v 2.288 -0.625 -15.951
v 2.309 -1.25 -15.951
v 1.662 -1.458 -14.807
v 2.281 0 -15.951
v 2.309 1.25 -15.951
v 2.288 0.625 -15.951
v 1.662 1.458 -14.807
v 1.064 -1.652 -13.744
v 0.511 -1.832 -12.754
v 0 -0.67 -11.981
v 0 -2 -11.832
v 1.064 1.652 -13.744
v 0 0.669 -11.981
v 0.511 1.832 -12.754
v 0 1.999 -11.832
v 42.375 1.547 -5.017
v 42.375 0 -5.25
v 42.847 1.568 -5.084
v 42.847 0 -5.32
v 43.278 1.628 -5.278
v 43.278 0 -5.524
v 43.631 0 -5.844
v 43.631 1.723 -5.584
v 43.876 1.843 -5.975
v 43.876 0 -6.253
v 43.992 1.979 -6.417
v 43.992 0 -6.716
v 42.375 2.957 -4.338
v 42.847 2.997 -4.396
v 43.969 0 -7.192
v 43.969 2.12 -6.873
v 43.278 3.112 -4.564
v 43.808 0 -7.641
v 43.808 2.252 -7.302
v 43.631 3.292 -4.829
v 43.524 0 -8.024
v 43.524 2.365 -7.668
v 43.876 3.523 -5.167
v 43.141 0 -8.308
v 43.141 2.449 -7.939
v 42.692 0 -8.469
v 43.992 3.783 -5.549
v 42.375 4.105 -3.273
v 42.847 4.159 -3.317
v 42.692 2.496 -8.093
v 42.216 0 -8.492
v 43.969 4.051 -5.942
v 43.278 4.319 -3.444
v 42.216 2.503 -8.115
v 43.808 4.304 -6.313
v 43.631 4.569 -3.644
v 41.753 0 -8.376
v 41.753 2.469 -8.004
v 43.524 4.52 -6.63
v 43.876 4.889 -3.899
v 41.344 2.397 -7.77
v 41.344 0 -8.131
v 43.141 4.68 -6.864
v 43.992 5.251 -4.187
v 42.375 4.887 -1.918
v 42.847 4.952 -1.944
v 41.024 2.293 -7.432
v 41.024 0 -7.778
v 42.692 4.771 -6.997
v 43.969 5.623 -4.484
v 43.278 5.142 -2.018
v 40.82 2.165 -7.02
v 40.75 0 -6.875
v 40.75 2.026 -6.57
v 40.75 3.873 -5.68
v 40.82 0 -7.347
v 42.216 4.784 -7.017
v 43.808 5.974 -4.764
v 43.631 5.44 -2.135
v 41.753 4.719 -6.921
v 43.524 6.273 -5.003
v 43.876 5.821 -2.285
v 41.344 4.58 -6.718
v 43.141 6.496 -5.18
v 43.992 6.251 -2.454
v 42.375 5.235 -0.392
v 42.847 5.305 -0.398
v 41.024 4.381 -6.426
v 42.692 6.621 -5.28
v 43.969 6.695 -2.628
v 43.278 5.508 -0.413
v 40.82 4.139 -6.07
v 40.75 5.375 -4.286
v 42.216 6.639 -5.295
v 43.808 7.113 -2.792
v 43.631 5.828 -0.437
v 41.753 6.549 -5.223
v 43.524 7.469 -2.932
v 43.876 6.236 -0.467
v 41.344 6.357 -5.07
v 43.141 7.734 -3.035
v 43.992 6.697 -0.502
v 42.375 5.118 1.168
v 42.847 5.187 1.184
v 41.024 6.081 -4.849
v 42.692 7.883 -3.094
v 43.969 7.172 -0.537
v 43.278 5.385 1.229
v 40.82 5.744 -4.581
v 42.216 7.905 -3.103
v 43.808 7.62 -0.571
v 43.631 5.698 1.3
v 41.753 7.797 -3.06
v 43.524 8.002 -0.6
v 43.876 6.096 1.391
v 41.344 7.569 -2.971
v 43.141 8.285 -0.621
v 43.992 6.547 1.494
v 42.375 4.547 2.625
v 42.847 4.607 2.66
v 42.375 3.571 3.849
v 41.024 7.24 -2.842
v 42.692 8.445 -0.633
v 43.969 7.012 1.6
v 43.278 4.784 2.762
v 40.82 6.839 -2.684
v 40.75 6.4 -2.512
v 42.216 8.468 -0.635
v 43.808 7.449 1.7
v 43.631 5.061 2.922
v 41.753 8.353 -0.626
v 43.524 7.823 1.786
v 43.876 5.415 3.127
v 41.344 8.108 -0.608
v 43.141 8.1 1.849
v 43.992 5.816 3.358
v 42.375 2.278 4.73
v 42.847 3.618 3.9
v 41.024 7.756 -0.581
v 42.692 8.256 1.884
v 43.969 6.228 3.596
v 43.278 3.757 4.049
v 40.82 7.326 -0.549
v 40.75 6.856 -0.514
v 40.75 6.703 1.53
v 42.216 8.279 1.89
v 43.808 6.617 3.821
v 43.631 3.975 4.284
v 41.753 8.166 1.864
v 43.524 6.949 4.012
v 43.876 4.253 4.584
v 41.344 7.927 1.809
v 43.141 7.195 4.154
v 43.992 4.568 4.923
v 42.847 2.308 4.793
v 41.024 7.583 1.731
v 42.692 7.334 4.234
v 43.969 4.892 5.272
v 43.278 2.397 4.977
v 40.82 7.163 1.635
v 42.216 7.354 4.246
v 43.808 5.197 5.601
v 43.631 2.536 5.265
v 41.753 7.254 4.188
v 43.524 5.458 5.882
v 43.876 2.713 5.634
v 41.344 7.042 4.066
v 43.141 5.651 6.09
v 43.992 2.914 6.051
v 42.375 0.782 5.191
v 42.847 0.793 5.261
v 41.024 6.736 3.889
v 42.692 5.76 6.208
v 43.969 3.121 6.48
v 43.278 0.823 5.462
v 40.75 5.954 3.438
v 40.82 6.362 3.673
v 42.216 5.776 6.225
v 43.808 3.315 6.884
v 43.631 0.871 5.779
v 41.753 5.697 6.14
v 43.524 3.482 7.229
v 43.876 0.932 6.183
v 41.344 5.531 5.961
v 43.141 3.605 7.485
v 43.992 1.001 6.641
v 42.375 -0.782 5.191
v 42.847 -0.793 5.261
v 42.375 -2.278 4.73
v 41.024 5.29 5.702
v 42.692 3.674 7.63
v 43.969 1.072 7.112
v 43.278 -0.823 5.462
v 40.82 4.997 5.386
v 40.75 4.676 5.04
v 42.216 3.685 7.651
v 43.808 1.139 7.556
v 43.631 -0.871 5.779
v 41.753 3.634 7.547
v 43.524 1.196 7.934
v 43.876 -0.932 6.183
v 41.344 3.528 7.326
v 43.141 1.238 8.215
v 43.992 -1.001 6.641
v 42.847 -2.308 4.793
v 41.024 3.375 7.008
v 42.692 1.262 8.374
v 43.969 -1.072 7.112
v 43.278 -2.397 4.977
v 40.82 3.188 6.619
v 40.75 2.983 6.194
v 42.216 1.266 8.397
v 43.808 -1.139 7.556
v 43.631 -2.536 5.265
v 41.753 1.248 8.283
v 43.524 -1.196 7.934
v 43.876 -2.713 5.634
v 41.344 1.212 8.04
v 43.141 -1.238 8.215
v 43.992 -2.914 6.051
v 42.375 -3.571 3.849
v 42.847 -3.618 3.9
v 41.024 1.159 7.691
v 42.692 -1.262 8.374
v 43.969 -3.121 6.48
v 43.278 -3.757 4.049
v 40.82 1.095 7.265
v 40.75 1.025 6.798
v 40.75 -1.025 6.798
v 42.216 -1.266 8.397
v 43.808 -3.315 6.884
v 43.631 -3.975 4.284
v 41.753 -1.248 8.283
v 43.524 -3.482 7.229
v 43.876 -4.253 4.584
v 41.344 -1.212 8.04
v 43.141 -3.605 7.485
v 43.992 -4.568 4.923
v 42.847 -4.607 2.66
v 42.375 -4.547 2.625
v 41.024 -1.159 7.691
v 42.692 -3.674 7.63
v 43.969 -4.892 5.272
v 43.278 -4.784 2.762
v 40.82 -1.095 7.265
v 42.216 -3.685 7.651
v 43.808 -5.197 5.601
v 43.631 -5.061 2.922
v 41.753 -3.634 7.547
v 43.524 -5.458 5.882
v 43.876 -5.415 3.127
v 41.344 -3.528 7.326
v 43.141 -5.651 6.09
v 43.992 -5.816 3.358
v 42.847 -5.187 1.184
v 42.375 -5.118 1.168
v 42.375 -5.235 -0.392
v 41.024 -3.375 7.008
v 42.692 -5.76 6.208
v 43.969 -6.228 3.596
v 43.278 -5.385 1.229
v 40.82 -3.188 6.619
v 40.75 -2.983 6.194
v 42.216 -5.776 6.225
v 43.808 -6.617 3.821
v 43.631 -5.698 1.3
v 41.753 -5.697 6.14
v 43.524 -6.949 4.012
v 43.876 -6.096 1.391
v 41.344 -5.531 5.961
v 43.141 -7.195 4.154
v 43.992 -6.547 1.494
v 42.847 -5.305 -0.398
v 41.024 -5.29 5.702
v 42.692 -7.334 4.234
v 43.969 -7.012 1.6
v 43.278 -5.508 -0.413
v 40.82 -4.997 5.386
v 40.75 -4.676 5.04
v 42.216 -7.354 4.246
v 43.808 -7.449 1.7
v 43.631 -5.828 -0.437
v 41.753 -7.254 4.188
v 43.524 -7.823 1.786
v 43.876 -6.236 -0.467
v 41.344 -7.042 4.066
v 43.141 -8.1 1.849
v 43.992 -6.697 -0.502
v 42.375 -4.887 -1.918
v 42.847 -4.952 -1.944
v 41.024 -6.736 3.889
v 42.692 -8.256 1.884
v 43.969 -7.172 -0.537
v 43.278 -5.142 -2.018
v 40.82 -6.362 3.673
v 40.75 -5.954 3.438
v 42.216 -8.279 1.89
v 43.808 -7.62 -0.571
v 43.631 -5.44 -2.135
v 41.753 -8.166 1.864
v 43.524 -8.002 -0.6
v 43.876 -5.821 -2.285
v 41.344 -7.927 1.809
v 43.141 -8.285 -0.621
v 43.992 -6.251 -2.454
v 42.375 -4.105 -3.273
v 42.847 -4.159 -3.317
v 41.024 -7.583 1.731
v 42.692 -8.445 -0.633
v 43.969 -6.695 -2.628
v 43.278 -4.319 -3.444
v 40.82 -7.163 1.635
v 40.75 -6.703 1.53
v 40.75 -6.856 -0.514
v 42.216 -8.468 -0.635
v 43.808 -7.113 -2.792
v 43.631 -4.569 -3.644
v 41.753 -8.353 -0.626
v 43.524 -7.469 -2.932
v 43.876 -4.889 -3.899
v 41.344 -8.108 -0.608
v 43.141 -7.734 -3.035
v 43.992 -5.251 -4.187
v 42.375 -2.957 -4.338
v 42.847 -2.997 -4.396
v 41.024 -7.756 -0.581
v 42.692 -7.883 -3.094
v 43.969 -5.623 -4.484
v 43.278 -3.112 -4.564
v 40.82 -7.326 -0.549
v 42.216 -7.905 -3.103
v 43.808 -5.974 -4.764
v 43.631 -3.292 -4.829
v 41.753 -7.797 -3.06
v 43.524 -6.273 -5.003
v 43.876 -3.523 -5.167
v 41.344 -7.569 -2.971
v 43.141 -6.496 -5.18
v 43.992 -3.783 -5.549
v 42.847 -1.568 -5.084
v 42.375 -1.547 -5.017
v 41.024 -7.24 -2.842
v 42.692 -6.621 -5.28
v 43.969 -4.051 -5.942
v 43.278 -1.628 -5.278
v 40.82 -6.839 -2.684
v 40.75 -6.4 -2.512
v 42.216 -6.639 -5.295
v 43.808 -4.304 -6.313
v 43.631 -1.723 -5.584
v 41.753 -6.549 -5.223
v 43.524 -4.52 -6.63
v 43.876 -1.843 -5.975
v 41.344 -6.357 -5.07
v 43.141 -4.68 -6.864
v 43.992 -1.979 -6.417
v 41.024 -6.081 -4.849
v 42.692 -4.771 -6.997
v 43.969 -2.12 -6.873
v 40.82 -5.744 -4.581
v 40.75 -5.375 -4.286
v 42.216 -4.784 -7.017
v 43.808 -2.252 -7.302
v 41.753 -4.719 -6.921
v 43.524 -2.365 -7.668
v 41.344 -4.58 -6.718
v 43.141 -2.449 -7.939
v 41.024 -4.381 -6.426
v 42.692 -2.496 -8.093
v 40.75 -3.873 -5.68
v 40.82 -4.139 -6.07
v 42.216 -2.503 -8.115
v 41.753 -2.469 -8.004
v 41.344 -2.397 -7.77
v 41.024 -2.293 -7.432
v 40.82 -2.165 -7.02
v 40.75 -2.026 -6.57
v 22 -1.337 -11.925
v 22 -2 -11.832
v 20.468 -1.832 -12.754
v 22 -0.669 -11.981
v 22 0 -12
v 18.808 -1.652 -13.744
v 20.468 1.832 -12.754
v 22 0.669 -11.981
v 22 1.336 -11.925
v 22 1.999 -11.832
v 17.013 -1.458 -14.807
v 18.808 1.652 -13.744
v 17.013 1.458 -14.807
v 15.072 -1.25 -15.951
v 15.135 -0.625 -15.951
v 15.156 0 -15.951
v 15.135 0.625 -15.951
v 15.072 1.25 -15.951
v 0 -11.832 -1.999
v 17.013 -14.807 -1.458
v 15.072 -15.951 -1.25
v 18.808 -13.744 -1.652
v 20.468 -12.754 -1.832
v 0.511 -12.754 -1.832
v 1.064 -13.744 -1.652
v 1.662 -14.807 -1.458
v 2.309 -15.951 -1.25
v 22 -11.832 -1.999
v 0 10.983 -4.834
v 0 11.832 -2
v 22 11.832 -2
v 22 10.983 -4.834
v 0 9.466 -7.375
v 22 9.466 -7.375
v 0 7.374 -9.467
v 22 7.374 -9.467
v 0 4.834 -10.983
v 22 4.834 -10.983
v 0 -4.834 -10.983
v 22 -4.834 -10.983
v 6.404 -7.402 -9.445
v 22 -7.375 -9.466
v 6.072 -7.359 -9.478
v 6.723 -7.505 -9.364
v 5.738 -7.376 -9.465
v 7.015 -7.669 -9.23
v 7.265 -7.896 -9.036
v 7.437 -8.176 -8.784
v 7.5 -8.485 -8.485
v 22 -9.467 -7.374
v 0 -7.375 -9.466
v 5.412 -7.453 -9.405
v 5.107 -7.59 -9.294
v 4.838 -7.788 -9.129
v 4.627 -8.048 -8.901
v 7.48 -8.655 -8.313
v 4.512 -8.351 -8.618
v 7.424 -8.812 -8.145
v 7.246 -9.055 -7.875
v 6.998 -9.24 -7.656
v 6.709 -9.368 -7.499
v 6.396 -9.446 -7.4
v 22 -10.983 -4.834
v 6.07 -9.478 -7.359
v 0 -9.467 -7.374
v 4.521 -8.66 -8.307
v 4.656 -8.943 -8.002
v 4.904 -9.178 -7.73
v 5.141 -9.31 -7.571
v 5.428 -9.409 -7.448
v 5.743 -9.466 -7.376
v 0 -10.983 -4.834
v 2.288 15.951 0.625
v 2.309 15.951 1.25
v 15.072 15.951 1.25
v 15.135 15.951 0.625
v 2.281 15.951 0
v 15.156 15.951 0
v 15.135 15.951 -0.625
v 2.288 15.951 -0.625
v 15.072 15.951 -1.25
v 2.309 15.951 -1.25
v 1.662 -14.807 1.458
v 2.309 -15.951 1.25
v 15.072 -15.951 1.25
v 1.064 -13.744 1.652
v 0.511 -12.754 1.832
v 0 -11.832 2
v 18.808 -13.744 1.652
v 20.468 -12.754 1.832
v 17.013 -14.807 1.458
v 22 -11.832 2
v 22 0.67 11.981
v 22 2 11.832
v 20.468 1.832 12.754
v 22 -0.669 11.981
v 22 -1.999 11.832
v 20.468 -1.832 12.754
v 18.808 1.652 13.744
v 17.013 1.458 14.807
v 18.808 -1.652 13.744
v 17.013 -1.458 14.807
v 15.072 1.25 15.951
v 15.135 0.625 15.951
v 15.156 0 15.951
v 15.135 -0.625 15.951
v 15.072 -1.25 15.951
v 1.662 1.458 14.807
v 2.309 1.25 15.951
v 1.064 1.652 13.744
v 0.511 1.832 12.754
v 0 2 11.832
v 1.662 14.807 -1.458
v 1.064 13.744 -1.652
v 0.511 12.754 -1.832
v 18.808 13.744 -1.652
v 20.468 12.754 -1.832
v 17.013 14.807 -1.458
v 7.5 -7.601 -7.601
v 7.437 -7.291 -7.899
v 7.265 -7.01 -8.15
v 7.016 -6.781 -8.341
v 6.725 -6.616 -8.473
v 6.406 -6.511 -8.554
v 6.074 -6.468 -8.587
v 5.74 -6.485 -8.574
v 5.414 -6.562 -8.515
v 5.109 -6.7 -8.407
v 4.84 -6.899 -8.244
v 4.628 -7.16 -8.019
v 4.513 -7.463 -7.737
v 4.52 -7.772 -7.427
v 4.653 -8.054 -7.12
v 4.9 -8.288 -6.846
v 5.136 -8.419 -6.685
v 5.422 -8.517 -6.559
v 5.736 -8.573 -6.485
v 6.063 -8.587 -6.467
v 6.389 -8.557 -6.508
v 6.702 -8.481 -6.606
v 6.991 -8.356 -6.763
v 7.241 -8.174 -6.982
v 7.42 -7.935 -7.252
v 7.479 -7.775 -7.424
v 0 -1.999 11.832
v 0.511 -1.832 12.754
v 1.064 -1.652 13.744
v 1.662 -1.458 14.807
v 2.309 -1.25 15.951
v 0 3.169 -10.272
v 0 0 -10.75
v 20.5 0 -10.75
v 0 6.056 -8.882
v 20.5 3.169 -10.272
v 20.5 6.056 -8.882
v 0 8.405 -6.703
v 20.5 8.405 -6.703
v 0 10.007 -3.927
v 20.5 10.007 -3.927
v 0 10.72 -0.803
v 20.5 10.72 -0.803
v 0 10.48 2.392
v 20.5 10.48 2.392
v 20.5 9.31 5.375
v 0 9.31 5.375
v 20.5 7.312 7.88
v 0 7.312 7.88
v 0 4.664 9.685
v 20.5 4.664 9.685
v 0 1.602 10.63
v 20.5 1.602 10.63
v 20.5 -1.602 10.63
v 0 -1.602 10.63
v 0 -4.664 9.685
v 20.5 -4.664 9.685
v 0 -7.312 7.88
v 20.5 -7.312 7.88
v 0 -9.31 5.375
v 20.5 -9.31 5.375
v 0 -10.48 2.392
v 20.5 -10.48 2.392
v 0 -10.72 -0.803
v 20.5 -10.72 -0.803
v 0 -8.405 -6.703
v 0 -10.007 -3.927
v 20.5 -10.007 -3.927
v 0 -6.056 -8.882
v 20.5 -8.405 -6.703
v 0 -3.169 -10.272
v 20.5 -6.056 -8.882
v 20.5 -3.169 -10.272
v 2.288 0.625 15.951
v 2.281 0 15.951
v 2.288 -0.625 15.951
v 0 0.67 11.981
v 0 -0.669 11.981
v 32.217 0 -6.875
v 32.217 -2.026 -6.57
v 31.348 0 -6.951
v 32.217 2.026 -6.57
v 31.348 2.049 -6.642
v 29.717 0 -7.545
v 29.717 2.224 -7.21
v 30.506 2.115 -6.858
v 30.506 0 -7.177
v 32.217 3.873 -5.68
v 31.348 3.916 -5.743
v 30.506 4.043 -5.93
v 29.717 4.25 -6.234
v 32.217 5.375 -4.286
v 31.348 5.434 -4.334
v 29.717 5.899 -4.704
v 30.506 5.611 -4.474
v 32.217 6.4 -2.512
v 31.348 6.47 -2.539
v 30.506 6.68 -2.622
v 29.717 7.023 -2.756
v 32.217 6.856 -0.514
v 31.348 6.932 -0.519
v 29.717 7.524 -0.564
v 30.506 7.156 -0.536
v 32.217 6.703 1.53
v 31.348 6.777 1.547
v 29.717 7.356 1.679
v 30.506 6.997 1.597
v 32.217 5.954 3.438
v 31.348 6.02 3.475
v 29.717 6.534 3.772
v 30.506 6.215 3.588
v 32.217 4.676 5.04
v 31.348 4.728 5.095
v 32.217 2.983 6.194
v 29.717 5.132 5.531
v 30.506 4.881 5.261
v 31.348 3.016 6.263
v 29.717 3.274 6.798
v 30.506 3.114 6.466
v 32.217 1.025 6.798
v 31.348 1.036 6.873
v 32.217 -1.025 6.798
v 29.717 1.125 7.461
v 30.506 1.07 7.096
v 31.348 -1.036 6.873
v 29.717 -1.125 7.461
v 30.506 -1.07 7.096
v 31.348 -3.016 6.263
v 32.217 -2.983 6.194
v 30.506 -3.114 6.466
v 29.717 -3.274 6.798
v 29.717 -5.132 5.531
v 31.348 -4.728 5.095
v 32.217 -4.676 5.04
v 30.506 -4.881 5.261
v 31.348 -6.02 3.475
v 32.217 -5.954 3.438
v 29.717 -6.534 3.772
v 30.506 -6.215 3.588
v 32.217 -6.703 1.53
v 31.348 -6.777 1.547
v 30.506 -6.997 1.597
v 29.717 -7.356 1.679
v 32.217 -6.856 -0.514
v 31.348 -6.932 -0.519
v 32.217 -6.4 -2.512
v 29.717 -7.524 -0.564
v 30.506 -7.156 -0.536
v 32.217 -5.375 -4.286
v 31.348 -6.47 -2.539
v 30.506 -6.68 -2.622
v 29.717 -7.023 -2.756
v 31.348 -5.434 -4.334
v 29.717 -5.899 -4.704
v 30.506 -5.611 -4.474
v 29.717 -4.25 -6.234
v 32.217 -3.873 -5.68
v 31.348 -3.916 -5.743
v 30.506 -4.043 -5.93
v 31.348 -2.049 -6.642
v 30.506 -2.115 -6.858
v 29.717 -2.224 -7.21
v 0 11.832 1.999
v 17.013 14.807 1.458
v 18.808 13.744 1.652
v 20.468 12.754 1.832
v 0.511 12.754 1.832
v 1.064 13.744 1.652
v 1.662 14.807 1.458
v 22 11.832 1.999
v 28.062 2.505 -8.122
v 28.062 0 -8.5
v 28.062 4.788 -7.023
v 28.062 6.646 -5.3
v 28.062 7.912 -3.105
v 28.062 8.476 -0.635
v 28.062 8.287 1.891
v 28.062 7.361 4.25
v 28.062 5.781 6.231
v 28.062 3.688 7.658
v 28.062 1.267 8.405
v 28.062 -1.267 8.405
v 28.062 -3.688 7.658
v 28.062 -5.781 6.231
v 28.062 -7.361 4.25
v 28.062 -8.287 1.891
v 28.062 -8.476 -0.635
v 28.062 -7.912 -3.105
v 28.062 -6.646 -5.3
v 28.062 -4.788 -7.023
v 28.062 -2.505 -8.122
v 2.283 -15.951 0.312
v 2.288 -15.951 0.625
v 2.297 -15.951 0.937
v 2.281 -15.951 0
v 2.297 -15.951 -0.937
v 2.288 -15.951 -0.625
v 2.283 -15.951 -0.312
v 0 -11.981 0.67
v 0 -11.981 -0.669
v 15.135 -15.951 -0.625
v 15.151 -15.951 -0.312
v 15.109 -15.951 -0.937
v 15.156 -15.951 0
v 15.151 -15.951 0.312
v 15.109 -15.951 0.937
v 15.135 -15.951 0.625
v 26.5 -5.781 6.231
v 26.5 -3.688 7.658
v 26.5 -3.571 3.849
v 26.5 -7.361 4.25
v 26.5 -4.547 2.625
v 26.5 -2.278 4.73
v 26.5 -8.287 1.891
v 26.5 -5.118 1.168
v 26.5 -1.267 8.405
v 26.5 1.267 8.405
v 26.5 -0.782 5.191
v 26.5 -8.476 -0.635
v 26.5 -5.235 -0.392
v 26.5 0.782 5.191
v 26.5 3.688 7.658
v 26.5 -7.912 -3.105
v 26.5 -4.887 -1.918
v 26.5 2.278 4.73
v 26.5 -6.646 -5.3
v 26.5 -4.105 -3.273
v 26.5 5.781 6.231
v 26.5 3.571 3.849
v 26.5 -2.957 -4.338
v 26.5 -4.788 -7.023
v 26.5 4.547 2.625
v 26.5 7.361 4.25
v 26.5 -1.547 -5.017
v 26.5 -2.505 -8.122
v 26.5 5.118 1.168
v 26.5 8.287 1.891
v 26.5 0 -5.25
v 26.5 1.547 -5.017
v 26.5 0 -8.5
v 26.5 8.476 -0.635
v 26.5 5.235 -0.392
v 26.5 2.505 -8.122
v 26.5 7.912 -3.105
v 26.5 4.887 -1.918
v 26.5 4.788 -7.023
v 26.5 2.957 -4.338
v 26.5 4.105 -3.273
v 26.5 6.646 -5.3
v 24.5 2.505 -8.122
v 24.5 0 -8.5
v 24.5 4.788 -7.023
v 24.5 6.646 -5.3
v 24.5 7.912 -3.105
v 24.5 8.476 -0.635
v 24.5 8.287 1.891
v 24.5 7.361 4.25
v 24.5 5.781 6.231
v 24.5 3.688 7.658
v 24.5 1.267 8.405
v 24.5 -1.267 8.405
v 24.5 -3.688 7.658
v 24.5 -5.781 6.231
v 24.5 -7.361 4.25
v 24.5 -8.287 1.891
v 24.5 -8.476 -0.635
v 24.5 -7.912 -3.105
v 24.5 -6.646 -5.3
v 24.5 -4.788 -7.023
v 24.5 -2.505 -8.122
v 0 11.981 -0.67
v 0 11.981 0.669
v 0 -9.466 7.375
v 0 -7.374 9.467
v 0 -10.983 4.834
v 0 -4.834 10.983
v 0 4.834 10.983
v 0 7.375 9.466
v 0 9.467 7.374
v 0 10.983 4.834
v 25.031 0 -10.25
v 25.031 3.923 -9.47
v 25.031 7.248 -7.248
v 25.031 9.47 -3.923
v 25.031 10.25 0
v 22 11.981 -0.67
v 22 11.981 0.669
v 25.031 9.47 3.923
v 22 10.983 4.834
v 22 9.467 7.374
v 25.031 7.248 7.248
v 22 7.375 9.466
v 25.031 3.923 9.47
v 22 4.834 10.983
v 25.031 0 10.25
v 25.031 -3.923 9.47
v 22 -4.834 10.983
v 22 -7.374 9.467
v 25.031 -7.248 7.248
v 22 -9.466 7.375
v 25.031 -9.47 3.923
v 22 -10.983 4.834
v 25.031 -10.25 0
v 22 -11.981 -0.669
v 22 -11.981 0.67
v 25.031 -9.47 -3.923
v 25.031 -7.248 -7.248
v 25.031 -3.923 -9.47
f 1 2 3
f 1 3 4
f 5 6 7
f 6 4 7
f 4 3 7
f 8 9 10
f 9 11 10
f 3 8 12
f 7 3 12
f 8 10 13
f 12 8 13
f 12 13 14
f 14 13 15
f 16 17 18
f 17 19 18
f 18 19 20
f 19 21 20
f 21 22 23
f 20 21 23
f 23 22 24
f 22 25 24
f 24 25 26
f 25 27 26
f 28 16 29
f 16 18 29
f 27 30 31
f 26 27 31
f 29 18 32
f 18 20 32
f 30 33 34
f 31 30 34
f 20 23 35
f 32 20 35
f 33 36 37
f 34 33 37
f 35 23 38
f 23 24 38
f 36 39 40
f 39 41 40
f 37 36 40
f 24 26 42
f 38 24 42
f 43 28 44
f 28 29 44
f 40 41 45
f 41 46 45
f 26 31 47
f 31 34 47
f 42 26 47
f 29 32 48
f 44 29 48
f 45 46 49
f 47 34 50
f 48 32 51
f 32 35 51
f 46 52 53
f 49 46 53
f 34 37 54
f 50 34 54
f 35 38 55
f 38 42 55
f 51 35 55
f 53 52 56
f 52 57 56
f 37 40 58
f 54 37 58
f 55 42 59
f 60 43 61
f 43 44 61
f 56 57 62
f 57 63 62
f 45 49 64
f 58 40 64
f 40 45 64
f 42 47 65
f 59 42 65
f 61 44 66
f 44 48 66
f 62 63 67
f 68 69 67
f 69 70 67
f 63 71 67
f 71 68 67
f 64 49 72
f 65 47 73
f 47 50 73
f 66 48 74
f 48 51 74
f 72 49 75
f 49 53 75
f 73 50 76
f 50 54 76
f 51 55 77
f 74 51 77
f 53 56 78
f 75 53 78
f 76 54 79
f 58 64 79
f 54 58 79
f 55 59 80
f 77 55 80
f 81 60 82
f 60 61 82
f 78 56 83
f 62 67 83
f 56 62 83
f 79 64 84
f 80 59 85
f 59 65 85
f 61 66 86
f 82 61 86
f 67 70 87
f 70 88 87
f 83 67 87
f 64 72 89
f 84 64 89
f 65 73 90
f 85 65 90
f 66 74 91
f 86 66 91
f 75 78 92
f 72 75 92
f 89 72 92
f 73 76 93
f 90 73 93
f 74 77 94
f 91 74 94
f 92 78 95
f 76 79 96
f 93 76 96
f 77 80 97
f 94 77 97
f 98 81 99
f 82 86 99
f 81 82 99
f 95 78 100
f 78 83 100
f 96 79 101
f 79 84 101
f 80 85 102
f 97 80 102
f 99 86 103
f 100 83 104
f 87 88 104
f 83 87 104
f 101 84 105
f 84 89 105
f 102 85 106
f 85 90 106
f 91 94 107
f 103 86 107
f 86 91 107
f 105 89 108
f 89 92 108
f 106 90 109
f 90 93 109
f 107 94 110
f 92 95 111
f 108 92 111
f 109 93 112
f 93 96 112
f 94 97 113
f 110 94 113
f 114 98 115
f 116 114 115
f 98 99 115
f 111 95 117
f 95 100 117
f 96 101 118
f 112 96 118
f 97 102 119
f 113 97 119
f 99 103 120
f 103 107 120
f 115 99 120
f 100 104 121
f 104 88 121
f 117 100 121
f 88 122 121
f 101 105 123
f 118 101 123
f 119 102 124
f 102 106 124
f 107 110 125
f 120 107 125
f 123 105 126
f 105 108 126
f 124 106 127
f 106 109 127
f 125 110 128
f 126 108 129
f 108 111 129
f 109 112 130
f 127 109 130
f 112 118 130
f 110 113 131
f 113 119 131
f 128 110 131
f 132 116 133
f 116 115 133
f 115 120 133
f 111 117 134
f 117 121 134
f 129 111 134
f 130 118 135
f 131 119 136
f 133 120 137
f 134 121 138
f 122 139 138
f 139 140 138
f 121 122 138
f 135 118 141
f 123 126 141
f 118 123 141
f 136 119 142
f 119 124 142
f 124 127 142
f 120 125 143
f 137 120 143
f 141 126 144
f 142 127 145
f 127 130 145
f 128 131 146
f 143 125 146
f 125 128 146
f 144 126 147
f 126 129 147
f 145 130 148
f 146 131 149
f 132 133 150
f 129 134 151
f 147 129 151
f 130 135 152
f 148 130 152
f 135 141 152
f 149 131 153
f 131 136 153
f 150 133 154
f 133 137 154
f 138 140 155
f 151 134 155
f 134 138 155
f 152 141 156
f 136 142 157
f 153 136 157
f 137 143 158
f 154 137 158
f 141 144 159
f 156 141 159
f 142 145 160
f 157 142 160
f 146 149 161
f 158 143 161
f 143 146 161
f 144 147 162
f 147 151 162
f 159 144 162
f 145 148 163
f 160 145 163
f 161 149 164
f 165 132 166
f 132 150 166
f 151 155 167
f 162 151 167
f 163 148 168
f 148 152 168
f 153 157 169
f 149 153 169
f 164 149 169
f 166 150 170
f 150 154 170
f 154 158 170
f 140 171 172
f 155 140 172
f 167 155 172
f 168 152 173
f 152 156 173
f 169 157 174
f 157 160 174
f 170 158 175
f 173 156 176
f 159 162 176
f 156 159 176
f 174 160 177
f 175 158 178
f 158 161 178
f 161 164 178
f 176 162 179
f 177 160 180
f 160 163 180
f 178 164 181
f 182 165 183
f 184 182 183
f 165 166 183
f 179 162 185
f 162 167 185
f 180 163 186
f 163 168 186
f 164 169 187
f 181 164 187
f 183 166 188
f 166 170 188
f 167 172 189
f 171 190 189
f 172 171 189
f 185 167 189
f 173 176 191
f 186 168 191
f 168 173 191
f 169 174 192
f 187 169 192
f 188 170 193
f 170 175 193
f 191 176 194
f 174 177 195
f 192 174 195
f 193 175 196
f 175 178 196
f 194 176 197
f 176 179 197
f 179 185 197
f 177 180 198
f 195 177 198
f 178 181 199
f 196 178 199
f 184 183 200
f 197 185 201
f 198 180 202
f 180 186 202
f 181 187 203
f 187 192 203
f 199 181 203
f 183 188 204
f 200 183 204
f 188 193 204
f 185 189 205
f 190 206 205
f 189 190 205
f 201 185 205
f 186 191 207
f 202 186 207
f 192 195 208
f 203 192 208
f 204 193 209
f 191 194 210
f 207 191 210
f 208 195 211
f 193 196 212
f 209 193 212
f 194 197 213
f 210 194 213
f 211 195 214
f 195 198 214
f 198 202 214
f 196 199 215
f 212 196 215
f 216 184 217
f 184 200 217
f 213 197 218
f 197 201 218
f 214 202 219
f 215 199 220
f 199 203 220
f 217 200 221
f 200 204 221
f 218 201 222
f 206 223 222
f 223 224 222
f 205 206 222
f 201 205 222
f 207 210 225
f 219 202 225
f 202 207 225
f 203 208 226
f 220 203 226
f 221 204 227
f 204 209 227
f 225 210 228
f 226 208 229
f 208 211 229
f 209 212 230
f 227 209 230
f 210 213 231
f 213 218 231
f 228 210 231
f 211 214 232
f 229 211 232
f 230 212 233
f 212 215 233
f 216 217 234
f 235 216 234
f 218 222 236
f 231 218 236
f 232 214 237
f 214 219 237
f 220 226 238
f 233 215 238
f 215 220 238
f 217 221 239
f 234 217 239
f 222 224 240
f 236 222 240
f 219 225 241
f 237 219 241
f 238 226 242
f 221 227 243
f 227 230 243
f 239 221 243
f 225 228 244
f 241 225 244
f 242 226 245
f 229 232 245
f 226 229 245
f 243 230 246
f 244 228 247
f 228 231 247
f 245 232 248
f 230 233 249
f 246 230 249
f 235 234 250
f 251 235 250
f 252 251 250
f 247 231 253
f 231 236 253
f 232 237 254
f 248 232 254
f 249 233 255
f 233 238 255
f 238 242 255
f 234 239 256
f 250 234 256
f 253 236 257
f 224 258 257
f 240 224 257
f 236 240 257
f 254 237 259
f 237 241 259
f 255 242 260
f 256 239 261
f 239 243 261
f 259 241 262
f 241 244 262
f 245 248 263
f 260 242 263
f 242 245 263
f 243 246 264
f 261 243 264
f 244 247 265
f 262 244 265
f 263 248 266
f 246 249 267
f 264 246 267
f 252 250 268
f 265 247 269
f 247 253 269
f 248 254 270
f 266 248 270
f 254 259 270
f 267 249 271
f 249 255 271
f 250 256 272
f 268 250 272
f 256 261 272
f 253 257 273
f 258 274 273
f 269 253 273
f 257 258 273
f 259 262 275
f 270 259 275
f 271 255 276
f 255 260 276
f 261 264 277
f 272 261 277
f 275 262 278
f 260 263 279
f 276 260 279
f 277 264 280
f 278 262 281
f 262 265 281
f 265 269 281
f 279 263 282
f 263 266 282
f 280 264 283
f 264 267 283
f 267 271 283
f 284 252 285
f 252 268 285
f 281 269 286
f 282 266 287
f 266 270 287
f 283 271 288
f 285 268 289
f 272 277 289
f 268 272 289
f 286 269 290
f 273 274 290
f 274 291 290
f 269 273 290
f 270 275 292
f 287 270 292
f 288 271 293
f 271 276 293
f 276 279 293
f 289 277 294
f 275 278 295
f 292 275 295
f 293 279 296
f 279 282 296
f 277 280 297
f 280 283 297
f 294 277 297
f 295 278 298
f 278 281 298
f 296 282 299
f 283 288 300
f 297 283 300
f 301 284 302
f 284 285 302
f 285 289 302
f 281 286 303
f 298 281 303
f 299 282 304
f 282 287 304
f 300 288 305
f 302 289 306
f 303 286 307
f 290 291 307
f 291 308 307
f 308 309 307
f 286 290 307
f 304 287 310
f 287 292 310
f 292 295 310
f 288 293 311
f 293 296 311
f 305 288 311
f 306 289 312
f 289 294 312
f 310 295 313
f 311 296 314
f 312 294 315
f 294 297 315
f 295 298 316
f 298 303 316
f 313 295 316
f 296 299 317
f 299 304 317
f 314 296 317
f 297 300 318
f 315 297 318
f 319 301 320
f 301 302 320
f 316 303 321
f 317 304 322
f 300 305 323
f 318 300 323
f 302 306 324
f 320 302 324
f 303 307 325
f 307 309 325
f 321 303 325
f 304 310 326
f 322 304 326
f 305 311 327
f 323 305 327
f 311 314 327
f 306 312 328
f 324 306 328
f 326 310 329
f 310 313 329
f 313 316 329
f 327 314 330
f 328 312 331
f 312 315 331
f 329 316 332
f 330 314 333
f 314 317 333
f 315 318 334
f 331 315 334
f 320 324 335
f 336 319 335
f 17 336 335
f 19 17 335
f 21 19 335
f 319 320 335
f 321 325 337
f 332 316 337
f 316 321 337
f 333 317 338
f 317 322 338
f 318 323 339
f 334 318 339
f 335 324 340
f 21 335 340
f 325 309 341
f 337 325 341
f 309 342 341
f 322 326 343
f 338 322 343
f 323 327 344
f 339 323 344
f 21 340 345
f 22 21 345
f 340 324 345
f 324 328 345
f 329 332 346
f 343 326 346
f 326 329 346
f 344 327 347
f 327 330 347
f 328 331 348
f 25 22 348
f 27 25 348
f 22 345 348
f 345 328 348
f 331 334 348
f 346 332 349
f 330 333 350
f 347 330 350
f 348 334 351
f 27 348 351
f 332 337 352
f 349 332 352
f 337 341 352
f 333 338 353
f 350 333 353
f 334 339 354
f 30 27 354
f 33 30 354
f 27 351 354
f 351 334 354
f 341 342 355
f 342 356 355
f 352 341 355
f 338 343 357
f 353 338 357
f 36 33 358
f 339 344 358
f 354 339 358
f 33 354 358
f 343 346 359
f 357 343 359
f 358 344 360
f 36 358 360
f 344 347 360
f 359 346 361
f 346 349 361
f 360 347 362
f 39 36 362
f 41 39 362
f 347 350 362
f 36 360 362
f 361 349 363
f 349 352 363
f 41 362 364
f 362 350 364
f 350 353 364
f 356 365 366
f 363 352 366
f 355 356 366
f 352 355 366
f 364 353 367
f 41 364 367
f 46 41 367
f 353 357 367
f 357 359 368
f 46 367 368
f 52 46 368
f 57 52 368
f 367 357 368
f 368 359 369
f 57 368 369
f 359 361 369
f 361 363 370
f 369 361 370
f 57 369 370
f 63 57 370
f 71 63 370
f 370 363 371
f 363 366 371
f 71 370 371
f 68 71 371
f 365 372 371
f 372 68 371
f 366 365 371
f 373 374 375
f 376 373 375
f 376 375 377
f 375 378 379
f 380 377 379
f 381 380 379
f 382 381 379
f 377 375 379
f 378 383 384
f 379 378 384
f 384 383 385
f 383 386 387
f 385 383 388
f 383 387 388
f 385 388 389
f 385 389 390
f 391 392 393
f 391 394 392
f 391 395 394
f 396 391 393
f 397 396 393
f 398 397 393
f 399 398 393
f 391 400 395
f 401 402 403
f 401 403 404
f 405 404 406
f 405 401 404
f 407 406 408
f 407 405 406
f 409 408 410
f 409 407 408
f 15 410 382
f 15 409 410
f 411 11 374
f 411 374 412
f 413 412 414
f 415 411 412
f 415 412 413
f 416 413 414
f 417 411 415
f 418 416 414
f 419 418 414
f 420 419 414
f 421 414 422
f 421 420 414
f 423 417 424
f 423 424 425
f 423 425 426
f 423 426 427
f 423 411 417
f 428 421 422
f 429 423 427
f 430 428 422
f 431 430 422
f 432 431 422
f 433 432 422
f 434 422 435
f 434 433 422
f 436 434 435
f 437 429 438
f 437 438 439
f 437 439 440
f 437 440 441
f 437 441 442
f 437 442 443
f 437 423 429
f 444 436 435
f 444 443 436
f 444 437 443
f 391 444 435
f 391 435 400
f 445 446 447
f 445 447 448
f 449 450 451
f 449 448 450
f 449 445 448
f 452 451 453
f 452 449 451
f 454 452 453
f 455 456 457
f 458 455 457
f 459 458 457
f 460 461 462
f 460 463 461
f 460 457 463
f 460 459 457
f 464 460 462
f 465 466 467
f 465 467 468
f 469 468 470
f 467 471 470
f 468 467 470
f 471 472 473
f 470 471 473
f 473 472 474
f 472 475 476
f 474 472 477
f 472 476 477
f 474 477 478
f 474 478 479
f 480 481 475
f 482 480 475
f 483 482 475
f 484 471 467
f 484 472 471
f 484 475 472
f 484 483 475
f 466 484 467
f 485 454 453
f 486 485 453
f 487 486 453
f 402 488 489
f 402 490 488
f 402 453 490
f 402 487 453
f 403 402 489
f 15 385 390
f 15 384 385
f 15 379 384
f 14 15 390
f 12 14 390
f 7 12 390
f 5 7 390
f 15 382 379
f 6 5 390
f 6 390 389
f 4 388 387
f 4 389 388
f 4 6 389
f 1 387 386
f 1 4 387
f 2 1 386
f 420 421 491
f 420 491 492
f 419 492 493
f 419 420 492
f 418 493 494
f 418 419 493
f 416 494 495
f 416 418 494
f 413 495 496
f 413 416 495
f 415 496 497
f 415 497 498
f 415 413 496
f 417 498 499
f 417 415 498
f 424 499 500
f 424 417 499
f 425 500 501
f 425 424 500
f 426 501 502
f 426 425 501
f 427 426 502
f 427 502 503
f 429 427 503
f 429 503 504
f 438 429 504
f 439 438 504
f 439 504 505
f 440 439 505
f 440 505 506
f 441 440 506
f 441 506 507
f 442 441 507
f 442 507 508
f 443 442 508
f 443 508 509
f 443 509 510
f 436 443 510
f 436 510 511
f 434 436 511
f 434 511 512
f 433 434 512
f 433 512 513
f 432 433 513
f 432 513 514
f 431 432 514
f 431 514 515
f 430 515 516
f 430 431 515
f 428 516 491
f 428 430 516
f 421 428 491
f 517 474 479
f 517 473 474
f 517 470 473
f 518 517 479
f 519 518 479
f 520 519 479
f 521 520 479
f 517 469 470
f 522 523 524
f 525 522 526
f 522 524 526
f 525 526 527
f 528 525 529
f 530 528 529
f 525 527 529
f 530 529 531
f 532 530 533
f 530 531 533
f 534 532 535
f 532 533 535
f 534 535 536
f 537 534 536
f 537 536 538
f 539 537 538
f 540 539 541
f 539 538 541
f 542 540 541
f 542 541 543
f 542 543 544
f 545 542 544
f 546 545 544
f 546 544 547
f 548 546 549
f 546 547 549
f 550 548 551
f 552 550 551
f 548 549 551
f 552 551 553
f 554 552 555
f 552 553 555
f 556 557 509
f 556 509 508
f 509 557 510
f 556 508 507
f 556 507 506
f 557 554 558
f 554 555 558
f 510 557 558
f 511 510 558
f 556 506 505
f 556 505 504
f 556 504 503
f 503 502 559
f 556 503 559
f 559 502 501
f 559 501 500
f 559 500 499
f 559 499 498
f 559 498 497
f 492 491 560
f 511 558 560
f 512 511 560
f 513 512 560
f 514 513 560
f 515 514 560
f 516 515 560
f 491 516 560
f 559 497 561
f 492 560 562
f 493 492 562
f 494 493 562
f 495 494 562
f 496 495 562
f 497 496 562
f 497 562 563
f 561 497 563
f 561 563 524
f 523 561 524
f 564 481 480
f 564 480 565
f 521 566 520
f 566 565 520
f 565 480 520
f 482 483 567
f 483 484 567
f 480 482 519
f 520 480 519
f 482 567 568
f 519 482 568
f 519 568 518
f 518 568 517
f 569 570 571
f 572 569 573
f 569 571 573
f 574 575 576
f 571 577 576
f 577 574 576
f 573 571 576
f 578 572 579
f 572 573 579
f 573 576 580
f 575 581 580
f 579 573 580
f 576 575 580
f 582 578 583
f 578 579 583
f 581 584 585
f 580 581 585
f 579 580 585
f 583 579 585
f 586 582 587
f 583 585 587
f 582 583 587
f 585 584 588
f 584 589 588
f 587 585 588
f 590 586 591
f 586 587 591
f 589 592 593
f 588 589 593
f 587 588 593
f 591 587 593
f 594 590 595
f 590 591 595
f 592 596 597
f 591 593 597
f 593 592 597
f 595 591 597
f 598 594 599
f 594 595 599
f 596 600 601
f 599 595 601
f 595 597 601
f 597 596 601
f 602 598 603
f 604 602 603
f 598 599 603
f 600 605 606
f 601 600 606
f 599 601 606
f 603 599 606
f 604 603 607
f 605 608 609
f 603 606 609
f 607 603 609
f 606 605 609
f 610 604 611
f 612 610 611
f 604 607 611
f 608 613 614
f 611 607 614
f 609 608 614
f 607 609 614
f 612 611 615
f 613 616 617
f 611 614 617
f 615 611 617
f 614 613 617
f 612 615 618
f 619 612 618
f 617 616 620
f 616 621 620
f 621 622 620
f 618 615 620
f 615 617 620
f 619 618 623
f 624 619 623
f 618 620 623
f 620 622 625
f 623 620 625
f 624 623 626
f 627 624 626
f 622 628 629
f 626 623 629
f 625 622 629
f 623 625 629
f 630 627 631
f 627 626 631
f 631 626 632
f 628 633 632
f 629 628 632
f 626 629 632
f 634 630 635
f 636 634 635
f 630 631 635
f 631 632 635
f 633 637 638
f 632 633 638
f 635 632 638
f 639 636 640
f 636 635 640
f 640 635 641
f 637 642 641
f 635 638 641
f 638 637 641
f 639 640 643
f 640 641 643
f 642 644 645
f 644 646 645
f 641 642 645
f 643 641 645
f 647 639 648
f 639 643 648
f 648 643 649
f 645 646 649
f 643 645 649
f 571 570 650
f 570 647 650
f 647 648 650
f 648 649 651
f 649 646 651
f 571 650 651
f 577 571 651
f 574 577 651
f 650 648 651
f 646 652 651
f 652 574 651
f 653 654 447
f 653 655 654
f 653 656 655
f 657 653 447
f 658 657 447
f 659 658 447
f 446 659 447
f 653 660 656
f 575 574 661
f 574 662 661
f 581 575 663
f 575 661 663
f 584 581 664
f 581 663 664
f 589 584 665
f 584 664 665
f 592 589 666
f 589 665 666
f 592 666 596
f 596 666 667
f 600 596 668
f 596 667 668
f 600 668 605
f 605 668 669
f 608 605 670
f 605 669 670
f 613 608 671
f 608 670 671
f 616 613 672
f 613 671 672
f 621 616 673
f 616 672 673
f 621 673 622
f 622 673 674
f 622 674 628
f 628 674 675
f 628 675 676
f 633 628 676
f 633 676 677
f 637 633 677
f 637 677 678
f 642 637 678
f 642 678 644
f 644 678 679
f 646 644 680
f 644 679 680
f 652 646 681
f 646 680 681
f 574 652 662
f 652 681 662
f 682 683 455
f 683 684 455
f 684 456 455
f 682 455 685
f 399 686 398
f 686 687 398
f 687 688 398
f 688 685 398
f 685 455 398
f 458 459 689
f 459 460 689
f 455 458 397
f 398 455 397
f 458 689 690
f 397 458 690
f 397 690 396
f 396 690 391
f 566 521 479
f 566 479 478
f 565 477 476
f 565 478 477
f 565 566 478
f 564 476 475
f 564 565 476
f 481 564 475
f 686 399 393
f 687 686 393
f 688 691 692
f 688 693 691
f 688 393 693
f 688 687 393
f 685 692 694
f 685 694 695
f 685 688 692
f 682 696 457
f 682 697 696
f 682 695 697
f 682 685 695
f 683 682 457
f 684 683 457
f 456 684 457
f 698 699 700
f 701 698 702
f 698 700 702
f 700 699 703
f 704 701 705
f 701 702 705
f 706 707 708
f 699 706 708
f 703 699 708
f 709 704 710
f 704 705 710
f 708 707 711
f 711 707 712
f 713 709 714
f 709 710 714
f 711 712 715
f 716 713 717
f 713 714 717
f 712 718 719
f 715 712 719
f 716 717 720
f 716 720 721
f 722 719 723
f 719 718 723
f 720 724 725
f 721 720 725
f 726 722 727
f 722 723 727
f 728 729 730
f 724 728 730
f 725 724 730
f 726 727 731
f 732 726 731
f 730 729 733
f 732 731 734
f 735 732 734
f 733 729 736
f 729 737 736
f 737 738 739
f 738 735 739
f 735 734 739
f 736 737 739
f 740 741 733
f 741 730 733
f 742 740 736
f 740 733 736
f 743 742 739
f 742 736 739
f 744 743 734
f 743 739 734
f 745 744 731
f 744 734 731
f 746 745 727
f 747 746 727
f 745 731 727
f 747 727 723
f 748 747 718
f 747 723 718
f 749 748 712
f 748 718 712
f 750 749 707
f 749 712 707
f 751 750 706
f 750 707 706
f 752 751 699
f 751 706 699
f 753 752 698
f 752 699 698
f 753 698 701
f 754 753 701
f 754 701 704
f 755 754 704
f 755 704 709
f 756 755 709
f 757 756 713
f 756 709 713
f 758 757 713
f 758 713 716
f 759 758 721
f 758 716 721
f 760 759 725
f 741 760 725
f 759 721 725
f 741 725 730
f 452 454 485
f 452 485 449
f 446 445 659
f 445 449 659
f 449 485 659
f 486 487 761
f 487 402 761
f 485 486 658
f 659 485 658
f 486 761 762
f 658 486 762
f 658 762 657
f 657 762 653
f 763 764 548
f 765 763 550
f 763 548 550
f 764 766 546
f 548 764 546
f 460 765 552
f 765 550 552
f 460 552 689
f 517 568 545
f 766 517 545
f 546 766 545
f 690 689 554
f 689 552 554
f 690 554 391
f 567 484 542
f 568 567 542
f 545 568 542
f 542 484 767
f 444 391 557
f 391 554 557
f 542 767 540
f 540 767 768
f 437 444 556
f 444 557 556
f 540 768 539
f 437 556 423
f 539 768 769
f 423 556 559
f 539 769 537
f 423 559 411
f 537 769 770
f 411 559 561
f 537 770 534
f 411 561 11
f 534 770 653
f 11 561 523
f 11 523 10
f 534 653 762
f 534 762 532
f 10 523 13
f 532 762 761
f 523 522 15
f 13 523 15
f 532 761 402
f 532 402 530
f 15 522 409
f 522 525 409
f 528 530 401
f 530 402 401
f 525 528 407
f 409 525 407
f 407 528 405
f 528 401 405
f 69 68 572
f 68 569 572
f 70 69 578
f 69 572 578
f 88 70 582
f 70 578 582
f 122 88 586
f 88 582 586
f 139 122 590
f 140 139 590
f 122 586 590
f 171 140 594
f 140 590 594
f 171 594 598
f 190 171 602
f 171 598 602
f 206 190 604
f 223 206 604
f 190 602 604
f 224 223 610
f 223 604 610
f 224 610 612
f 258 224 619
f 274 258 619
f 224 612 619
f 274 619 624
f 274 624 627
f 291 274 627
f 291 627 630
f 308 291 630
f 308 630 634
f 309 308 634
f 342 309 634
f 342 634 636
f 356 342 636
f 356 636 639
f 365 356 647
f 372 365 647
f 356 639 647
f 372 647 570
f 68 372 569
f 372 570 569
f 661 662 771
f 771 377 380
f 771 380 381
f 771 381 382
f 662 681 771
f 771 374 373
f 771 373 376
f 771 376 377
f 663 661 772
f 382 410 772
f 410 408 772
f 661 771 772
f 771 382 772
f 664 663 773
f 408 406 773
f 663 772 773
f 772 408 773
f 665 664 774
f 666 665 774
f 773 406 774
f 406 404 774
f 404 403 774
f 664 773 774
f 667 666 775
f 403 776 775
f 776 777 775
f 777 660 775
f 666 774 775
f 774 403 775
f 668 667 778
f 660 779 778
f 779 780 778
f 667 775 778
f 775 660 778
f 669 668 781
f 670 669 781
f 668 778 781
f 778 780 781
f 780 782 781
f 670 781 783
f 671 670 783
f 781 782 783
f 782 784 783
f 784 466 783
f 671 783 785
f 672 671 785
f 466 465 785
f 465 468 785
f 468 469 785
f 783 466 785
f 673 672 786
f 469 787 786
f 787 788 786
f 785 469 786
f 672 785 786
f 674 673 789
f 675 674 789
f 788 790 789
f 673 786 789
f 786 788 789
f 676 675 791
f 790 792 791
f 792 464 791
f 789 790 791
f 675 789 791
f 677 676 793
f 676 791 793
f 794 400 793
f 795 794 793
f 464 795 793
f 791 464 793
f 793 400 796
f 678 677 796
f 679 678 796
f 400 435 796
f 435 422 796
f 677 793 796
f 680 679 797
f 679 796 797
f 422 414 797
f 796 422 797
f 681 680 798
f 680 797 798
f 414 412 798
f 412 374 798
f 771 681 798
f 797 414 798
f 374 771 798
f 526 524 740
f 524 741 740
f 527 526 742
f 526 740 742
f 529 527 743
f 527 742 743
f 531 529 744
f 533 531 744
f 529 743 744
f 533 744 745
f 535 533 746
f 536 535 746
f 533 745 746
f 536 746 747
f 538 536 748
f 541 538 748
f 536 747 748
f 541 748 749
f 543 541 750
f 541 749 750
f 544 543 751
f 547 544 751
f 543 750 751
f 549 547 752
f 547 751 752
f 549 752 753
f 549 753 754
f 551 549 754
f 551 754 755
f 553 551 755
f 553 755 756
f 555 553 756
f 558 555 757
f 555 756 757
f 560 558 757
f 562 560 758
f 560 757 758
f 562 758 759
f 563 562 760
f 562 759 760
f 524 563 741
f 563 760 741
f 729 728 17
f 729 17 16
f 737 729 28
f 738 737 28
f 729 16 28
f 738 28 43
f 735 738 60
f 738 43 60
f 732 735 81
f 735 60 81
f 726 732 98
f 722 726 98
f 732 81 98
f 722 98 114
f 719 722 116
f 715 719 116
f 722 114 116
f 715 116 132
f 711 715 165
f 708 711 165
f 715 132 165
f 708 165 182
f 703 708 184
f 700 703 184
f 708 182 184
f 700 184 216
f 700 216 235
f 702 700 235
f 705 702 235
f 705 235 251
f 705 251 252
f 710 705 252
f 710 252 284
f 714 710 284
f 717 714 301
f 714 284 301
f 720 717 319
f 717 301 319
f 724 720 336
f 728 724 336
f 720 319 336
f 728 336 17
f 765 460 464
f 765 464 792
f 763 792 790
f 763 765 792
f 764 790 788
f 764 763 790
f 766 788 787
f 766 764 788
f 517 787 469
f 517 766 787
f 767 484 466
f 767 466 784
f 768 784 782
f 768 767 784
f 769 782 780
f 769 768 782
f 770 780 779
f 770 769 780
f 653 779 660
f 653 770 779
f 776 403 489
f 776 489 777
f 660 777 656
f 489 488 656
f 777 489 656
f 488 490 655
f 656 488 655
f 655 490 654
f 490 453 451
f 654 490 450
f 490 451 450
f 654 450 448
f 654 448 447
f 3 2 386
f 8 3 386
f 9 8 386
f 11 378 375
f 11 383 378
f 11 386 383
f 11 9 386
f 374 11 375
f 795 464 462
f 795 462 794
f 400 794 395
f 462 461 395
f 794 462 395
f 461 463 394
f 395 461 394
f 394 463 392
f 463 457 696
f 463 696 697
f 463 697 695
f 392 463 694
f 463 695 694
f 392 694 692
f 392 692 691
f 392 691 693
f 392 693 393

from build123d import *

# Parameters (mm, degrees)
CUT_EXTRUDE9_DEPTH  = 45.0000001
CUT_EXTRUDE10_REACH = 36.558
SKETCH8_R           = 1.5


with BuildPart() as part:
    # Sketch1 → Revolve1 (revolve)
    with BuildSketch(Plane(origin=(0, 0, 0), x_dir=(1, 0, 0), z_dir=(0, 1, 0))):
        with BuildLine():
            Line((0, 12), (0, 10.75))
            Line((0, 10.75), (3.5, 10.75))
            Line((3.5, 10.75), (18.5, 10.75))
            Line((18.5, 10.75), (20.5, 10.75))
            Line((20.5, 10.75), (24.5, 8.5))
            Line((24.5, 8.5), (26.5, 8.5))
            Line((26.5, 8.5), (26.5, 5.25))
            Line((26.5, 5.25), (42.375, 5.25))
            ThreePointArc((42.375, 5.25), (43.524048519, 8.024048519), (40.75, 6.875))
            Line((40.75, 6.875), (32.216506351, 6.875))
            ThreePointArc((32.216506351, 6.875), (30.922411125, 7.045370869), (29.716506351, 7.544872981))
            Line((29.716506351, 7.544872981), (28.062177826, 8.5))
            Line((28.062177826, 8.5), (22, 12))
            Line((22, 12), (0, 12))
        make_face()
    revolve(axis=Axis((-40.558590026, 0, 0), (1, 0, 0)))

    # Sketch5 → Revolve2 (revolve)
    with BuildSketch(Plane.XY):
        Polygon((22, -12), (15.07179677, -16), (2.309401077, -16), (0, -12), align=None)
    revolve(axis=Axis((-0.804180618, 0, 0), (1, 0, 0)))

    # Sketch7 → Cut-Extrude9 (cut, through all)
    with BuildSketch(Plane(origin=(0, 0, 0), x_dir=(0, 0, -1), z_dir=(1, 0, 0))):
        with BuildLine():
            ThreePointArc((1.25, 15.951097141), (0, 16), (-1.25, 15.951097141))
            Line((-1.25, 15.951097141), (1.25, 15.951097141))
        make_face()
        with BuildLine():
            Line((-11.832293992, -1.999204566), (-15.951097141, -1.25))
            ThreePointArc((-15.951097141, -1.25), (-11.313708499, -11.313708499), (-1.25, -15.951097141))
            Line((-1.25, -15.951097141), (-2, -11.832159566))
            ThreePointArc((-2, -11.832159566), (-8.485566586, -8.484996153), (-11.832293992, -1.999204566))
        make_face()
        with BuildLine():
            ThreePointArc((15.951097141, 1.25), (11.313708499, 11.313708499), (1.25, 15.951097141))
            Line((1.25, 15.951097141), (2, 11.832159566))
            ThreePointArc((2, 11.832159566), (8.485566586, 8.484996153), (11.832293992, 1.999204566))
            Line((11.832293992, 1.999204566), (15.951097141, 1.25))
        make_face()
        with BuildLine():
            Line((-15.951097141, 1.25), (-11.832159566, 2))
            ThreePointArc((-11.832159566, 2), (-8.484996153, 8.485566586), (-1.999204566, 11.832293992))
            Line((-1.999204566, 11.832293992), (-1.25, 15.951097141))
            ThreePointArc((-1.25, 15.951097141), (-11.313708499, 11.313708499), (-15.951097141, 1.25))
        make_face()
        with BuildLine():
            Line((1.999204566, -11.832293992), (1.25, -15.951097141))
            ThreePointArc((1.25, -15.951097141), (11.313708499, -11.313708499), (15.951097141, -1.25))
            Line((15.951097141, -1.25), (11.832159566, -2))
            ThreePointArc((11.832159566, -2), (8.484996153, -8.485566586), (1.999204566, -11.832293992))
        make_face()
        with BuildLine():
            Line((1.25, -15.951097141), (-1.25, -15.951097141))
            ThreePointArc((-1.25, -15.951097141), (0, -16), (1.25, -15.951097141))
        make_face()
        with BuildLine():
            Line((-15.951097141, -1.25), (-15.951097141, 1.25))
            ThreePointArc((-15.951097141, 1.25), (-16, 0), (-15.951097141, -1.25))
        make_face()
        with BuildLine():
            ThreePointArc((16, 0), (15.987769611, 0.625478115), (15.951097141, 1.25))
            Line((15.951097141, 1.25), (15.951097141, -1.25))
            ThreePointArc((15.951097141, -1.25), (15.987769611, -0.625478115), (16, 0))
        make_face()
    extrude(amount=CUT_EXTRUDE9_DEPTH, mode=Mode.SUBTRACT)

    # Sketch8 → Cut-Extrude10 (cut, up to next)
    with BuildSketch(Plane(origin=(0, -8.485281374, -8.485281374), x_dir=(1, 0, 0), z_dir=(0, 0.707106781, 0.707106781)), mode=Mode.PRIVATE) as cut_extrude10_sk1:
        with Locations((6, 0)):
            Circle(SKETCH8_R)
    cut_extrude10_tool1 = extrude(cut_extrude10_sk1.sketch, amount=CUT_EXTRUDE10_REACH, mode=Mode.PRIVATE) & part.part
    add(cut_extrude10_tool1.solids().sort_by_distance((6, -8.485281, -8.485281))[0], mode=Mode.SUBTRACT)


solid = part.part
